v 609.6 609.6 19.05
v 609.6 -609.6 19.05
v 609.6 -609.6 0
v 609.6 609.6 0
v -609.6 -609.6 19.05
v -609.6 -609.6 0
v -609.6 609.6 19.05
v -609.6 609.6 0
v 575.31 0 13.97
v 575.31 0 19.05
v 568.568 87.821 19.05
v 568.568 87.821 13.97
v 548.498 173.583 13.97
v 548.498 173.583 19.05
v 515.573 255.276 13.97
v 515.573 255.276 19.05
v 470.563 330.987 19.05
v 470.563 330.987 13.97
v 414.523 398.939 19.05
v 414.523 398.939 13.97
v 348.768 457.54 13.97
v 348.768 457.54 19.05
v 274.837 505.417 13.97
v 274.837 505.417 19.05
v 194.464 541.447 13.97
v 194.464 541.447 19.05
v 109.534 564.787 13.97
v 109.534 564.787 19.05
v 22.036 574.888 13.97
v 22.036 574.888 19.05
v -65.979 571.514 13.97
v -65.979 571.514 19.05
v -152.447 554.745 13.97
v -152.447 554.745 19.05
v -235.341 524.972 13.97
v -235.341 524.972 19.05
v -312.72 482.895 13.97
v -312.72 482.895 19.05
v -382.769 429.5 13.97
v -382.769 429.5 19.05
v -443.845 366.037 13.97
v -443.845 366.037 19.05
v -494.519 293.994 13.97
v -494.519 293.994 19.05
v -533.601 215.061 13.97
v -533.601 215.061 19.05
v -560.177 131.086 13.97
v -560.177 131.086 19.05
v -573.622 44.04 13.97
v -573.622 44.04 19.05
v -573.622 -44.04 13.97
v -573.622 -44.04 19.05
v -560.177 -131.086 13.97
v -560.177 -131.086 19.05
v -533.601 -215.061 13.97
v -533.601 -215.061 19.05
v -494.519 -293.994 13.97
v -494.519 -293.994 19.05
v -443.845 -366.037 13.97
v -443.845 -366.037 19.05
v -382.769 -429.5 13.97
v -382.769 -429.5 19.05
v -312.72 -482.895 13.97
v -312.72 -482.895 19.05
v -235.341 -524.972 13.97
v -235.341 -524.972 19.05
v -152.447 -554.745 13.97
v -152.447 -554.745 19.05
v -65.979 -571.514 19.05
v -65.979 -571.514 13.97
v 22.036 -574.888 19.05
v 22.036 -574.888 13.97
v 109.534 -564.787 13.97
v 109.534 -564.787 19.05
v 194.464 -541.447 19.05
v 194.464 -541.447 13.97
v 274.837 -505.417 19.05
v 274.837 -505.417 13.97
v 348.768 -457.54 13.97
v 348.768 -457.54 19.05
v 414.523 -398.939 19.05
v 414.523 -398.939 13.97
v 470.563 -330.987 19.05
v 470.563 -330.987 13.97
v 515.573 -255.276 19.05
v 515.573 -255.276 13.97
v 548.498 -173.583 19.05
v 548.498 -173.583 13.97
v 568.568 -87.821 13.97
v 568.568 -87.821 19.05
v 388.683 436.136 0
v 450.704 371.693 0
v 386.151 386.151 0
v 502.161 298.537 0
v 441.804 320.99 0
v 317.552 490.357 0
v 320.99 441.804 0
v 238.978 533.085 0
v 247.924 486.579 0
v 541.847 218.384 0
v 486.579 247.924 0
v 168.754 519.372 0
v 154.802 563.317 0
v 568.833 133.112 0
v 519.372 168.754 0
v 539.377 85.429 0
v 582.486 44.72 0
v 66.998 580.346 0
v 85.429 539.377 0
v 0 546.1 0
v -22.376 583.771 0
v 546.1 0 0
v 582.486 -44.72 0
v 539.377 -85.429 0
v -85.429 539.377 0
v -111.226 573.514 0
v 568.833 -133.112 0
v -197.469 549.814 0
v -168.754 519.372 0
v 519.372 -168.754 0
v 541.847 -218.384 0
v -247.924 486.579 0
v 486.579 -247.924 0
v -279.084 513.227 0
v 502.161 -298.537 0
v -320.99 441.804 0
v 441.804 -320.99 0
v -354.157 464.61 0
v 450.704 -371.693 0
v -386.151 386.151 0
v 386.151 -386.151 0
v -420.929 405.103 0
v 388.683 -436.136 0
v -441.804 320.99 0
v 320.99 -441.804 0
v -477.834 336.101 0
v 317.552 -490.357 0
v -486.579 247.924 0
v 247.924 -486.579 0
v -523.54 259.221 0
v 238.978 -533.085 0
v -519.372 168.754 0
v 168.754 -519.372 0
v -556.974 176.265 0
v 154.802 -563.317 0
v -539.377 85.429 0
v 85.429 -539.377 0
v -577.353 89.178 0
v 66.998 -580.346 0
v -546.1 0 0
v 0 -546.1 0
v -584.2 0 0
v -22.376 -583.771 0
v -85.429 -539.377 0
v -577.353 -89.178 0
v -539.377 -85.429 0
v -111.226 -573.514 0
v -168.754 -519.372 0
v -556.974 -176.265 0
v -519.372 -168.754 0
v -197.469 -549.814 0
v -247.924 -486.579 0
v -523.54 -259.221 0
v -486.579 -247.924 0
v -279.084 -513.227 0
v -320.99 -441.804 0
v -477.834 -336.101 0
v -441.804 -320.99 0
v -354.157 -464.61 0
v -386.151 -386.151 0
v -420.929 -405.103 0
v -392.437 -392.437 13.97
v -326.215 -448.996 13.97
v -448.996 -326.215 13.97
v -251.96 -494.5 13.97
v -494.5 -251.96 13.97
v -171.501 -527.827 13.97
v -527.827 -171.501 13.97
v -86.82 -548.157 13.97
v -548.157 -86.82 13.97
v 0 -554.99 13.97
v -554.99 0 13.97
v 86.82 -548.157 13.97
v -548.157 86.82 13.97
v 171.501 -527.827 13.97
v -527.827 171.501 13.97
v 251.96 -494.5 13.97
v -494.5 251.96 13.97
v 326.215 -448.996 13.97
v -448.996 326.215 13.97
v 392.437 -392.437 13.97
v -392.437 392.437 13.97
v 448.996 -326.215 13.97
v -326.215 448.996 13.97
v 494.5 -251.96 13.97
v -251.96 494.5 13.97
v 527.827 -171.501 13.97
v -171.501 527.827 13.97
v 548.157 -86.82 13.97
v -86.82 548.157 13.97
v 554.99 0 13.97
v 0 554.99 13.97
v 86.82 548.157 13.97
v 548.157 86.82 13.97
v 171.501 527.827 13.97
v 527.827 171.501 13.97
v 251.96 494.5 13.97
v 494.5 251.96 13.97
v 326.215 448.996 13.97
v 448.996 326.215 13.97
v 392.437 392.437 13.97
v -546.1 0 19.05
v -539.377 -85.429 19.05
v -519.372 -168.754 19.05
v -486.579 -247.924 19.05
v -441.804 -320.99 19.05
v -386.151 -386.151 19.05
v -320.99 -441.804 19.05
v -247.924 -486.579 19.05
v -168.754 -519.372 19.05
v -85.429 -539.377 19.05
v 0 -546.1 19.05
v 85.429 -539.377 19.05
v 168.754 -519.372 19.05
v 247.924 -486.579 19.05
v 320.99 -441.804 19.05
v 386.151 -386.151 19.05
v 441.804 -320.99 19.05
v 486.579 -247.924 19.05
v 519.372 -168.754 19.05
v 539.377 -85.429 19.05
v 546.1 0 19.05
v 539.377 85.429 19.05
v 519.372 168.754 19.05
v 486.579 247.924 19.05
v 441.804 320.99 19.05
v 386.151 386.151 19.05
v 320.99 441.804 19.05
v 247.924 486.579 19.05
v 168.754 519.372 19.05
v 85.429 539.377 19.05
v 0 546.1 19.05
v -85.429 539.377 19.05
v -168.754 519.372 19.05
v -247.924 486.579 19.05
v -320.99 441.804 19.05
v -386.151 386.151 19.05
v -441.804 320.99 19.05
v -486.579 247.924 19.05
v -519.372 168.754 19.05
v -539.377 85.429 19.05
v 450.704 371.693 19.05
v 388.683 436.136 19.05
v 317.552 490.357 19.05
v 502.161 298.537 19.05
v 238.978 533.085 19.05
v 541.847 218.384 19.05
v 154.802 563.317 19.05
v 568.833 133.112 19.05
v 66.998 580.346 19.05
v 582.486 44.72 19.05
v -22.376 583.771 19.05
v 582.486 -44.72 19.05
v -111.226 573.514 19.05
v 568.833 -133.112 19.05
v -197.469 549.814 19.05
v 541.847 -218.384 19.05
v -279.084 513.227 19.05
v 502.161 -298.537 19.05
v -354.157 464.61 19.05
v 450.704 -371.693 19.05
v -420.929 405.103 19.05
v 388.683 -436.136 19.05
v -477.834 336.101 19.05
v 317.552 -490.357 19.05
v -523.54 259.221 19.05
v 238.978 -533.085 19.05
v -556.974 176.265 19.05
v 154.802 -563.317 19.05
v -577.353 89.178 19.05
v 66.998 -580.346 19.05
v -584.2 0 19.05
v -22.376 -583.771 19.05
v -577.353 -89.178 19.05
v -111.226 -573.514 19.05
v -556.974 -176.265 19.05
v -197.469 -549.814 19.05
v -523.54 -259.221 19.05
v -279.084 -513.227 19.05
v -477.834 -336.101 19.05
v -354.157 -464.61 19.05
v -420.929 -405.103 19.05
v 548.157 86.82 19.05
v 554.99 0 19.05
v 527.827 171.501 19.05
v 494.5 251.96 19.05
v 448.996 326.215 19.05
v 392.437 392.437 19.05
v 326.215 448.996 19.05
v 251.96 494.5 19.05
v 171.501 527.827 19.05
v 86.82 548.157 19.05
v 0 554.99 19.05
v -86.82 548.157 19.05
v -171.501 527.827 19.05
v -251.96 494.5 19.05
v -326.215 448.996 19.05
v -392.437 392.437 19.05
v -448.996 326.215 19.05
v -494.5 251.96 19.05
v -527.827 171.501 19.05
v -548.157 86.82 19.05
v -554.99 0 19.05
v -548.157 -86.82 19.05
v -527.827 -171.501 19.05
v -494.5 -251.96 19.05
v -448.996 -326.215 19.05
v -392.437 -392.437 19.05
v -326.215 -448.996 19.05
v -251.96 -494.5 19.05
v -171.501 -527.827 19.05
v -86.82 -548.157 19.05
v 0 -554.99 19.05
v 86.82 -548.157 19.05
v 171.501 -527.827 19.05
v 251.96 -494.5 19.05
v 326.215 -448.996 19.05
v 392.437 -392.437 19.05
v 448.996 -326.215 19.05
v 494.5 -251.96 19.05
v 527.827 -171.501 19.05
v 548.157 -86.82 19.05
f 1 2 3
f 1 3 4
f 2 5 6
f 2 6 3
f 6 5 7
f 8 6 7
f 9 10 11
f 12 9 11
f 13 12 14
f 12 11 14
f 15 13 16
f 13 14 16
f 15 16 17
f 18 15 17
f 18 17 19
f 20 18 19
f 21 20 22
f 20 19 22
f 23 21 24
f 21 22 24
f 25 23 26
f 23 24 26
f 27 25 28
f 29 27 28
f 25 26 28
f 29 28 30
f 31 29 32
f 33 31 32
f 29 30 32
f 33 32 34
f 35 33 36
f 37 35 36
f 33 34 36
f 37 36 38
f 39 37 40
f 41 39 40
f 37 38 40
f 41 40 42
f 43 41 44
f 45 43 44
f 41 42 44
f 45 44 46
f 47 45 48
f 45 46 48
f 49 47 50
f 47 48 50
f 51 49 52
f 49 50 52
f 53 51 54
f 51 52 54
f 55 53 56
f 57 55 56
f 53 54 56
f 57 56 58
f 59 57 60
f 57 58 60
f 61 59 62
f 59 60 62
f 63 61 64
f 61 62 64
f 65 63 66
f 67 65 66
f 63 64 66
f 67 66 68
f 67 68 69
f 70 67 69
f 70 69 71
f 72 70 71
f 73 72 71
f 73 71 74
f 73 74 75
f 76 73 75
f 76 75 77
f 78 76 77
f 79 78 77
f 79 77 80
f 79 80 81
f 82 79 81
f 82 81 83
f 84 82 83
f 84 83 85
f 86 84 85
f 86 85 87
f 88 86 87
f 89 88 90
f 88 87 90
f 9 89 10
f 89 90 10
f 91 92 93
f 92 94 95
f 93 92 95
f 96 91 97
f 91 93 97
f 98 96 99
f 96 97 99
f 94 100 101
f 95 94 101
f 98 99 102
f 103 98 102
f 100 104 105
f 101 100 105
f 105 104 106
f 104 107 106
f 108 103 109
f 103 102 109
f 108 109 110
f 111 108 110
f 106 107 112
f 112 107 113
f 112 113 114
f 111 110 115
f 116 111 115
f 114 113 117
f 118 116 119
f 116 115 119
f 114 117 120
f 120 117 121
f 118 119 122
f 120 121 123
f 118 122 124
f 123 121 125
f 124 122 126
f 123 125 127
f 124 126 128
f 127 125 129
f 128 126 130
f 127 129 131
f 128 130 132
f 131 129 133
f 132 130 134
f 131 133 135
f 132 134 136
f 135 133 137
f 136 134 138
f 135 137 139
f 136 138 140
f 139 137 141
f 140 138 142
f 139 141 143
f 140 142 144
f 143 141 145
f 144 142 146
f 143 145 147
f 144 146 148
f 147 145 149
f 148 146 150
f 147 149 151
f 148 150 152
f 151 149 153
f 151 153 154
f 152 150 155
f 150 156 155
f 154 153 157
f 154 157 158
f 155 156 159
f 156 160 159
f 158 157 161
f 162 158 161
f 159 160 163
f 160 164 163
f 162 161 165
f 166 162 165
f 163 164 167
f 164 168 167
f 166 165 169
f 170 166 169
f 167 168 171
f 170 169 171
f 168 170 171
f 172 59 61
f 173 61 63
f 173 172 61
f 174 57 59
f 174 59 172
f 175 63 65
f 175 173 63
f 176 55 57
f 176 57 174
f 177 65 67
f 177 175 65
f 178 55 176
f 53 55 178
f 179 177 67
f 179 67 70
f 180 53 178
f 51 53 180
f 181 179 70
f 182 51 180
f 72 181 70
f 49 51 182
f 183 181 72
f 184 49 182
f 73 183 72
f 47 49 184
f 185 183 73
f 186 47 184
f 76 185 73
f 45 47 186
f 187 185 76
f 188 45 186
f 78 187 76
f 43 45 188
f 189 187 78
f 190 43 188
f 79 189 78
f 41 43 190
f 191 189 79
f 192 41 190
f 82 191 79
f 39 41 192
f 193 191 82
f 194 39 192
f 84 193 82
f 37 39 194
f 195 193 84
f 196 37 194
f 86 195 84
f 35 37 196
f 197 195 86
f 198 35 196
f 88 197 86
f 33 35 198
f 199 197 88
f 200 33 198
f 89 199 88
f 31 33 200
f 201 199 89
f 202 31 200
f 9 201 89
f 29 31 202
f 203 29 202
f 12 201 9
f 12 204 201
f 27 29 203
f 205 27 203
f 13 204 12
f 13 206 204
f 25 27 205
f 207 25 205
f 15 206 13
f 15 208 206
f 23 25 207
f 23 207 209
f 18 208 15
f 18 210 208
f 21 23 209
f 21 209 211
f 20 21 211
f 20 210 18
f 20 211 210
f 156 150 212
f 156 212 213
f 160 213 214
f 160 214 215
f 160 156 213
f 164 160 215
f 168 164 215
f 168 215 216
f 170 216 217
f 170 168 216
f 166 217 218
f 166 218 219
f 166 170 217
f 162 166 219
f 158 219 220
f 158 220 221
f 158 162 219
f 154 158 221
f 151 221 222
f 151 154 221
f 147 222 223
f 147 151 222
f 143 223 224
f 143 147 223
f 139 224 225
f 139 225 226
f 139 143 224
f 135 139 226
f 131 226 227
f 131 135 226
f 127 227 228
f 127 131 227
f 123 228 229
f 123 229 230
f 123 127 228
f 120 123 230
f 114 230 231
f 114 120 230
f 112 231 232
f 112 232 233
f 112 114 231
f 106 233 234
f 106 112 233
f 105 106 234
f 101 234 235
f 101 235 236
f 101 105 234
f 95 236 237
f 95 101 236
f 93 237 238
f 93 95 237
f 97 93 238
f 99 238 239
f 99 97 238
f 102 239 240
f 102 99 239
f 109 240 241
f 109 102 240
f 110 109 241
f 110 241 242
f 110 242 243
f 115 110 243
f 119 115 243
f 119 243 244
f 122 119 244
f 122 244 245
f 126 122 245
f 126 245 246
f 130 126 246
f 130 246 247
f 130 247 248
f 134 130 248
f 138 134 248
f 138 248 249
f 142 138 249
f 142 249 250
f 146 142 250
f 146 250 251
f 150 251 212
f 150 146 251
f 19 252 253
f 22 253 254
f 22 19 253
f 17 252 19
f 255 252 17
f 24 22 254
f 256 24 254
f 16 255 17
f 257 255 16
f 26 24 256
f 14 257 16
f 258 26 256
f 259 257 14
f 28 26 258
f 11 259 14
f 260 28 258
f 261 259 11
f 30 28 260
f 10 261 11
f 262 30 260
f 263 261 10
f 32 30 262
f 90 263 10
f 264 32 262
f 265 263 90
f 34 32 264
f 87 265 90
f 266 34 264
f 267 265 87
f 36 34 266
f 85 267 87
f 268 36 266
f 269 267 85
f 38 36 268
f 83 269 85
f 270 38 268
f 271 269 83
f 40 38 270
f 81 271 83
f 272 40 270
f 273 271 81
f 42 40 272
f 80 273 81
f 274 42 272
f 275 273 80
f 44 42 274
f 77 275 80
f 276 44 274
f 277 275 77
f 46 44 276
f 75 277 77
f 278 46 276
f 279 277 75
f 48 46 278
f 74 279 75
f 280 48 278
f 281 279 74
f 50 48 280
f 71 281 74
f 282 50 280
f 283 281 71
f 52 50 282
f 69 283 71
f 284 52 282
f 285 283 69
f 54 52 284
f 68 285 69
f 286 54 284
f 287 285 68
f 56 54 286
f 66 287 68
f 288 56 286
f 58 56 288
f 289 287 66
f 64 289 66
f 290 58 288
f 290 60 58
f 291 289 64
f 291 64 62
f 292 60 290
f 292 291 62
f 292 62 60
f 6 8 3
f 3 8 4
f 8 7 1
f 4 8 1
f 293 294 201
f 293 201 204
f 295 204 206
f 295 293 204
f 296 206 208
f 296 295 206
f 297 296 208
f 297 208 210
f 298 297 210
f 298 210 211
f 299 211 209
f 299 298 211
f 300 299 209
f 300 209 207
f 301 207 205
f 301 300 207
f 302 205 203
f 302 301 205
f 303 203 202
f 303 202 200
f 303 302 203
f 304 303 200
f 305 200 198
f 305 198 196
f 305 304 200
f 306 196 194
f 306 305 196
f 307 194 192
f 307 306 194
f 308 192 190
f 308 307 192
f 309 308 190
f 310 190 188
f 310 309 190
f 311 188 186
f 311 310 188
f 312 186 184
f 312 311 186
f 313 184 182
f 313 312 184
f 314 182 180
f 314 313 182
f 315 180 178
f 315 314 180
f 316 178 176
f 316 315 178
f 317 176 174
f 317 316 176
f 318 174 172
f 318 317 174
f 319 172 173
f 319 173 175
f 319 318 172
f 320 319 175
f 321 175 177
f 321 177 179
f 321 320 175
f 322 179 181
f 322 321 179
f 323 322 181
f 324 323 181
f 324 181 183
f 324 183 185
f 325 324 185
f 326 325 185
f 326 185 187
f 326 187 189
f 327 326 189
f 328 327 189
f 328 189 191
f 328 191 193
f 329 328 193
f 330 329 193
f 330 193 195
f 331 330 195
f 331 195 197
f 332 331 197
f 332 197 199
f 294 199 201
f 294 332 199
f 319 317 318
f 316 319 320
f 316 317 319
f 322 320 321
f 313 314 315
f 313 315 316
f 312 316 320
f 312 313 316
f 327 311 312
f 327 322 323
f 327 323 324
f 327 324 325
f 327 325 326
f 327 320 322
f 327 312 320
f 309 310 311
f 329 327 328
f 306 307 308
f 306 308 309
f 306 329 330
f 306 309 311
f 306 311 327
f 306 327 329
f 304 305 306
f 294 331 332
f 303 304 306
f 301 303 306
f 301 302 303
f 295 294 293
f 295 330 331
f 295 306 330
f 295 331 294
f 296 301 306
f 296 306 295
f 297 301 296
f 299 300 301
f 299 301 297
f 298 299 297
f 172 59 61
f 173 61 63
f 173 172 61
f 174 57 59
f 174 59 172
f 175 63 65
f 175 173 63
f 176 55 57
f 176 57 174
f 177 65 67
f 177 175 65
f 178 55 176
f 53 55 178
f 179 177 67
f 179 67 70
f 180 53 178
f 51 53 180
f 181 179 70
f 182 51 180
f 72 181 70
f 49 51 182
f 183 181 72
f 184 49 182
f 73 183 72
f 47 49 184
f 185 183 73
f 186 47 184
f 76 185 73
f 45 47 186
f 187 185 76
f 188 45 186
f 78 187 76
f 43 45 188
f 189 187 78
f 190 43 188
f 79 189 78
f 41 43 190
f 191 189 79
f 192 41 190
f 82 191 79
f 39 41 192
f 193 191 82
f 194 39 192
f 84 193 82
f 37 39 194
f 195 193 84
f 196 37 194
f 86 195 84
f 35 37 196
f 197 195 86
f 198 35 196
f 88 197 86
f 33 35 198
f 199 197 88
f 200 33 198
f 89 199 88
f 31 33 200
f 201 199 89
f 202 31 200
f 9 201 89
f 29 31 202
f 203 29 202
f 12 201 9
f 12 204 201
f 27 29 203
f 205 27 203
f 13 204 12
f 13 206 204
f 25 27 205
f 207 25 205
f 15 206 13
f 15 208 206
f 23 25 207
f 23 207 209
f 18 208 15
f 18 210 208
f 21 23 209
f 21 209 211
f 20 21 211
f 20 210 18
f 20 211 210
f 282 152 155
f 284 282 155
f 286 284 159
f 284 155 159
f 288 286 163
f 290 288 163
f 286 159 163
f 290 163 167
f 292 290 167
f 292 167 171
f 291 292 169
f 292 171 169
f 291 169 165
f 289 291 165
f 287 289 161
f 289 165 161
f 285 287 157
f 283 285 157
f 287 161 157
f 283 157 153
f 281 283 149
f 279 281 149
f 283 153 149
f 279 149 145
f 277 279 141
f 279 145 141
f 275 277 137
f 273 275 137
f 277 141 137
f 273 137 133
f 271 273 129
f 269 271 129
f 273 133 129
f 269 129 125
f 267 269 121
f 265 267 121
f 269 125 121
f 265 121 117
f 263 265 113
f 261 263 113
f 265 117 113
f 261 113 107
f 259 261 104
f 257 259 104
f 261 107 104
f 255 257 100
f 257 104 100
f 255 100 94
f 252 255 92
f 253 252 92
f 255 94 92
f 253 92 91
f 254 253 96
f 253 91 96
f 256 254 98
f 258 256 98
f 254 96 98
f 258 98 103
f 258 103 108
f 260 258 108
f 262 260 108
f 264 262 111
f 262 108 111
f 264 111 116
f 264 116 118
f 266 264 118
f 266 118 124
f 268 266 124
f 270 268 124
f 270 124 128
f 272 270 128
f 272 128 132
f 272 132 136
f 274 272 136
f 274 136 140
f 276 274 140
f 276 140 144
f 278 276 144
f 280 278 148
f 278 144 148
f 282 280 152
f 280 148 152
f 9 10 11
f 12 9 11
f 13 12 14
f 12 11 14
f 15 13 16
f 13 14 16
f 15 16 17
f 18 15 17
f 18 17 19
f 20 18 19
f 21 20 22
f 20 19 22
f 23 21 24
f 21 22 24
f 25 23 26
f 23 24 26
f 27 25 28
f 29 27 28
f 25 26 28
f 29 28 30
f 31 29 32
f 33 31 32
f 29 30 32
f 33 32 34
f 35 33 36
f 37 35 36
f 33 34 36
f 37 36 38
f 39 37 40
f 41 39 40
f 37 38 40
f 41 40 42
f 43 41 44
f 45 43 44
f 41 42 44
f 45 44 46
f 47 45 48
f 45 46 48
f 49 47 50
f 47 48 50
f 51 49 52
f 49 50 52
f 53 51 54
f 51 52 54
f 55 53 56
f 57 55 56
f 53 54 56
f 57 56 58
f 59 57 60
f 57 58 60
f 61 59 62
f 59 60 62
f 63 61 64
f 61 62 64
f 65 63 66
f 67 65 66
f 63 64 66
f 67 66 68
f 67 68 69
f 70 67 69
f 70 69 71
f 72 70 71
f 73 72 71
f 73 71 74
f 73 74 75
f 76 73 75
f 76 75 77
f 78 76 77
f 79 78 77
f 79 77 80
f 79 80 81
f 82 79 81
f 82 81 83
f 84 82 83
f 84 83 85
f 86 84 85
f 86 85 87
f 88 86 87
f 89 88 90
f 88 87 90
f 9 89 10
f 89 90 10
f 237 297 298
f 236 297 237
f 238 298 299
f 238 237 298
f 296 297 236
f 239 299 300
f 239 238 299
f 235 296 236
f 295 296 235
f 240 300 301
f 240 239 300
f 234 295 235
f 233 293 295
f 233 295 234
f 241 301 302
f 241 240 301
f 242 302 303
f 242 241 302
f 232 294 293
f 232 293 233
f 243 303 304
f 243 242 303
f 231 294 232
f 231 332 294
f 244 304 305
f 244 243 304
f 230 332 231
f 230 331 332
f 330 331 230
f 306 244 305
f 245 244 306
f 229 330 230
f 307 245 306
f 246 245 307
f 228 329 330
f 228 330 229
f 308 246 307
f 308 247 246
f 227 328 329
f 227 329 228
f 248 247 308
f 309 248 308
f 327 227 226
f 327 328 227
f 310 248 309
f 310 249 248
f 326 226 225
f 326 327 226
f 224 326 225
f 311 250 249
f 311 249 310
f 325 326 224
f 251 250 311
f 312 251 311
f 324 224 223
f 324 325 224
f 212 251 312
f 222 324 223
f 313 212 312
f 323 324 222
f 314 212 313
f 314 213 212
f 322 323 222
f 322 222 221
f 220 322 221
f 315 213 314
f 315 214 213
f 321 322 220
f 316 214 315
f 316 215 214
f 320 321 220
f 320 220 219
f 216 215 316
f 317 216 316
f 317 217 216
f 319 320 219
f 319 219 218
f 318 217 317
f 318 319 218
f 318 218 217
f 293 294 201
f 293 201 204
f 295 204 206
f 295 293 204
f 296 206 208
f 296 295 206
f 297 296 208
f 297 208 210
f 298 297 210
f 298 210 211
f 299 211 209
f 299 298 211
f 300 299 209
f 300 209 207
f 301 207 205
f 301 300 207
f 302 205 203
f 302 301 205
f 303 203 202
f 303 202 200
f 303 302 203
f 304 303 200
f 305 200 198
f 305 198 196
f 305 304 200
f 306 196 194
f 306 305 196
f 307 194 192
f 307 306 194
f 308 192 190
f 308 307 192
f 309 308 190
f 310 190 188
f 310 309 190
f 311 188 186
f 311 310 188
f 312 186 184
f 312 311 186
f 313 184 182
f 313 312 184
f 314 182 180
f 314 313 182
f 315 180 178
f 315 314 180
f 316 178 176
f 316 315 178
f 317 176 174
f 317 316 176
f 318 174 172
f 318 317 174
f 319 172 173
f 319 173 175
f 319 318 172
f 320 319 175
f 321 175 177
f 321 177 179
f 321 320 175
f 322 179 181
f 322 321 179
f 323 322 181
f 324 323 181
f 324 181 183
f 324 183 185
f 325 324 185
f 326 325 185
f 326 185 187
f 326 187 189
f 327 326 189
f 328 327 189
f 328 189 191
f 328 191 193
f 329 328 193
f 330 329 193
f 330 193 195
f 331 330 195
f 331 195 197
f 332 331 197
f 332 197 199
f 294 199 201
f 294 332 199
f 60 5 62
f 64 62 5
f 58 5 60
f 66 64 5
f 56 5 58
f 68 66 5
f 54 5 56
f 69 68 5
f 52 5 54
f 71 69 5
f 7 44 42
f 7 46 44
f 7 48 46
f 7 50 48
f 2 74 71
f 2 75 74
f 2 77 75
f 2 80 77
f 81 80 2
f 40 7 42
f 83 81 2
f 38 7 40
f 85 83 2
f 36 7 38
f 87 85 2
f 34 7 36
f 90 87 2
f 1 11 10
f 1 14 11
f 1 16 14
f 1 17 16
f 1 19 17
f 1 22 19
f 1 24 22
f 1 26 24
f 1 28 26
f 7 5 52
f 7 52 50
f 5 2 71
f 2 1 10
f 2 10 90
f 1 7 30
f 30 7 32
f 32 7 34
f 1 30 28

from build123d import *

# Parameters (mm, degrees)
SKETCH2_R           = 584.2
SKETCH2_R_2         = 546.1
BOSS_EXTRUDE1_DEPTH = 19.05
SKETCH3_W           = 1219.2
SKETCH3_H           = 1219.2
STOCK_DEPTH         = 19.05
SKETCH5_R           = 575.31
SKETCH5_R_2         = 554.99
CUT_EXTRUDE1_DEPTH  = 5.08


with BuildPart() as part:
    # Sketch2 → Boss-Extrude1 (new body)
    with BuildSketch(Plane.XY):
        with Locations(Location((0, 0, 0), (0, 0, 180))):
            Circle(SKETCH2_R)
        with Locations(Location((0, 0, 0), (0, 0, 180))):
            Circle(SKETCH2_R_2, mode=Mode.SUBTRACT)
    extrude(amount=BOSS_EXTRUDE1_DEPTH)


with BuildPart() as body_2:
    # Sketch3 → Stock (new body)
    with BuildSketch(Plane.XY.offset(19.05)):
        Rectangle(SKETCH3_W, SKETCH3_H)
    extrude(amount=-STOCK_DEPTH)


with BuildPart() as cut_extrude1_tool:
    # Sketch5 → Cut-Extrude1 (new body)
    with BuildSketch(Plane.XY.offset(19.05)):
        Circle(SKETCH5_R)
        Circle(SKETCH5_R_2, mode=Mode.SUBTRACT)
    extrude(amount=-CUT_EXTRUDE1_DEPTH)


with BuildPart() as part_1:
    add(part.part)

    # Cut-Extrude1: cut by cut_extrude1_tool
    add(cut_extrude1_tool.part, mode=Mode.SUBTRACT)


with BuildPart() as body_2_1:
    add(body_2.part)

    # Cut-Extrude1: cut by cut_extrude1_tool
    add(cut_extrude1_tool.part, mode=Mode.SUBTRACT)


solid = Compound([part_1.part, body_2_1.part])
